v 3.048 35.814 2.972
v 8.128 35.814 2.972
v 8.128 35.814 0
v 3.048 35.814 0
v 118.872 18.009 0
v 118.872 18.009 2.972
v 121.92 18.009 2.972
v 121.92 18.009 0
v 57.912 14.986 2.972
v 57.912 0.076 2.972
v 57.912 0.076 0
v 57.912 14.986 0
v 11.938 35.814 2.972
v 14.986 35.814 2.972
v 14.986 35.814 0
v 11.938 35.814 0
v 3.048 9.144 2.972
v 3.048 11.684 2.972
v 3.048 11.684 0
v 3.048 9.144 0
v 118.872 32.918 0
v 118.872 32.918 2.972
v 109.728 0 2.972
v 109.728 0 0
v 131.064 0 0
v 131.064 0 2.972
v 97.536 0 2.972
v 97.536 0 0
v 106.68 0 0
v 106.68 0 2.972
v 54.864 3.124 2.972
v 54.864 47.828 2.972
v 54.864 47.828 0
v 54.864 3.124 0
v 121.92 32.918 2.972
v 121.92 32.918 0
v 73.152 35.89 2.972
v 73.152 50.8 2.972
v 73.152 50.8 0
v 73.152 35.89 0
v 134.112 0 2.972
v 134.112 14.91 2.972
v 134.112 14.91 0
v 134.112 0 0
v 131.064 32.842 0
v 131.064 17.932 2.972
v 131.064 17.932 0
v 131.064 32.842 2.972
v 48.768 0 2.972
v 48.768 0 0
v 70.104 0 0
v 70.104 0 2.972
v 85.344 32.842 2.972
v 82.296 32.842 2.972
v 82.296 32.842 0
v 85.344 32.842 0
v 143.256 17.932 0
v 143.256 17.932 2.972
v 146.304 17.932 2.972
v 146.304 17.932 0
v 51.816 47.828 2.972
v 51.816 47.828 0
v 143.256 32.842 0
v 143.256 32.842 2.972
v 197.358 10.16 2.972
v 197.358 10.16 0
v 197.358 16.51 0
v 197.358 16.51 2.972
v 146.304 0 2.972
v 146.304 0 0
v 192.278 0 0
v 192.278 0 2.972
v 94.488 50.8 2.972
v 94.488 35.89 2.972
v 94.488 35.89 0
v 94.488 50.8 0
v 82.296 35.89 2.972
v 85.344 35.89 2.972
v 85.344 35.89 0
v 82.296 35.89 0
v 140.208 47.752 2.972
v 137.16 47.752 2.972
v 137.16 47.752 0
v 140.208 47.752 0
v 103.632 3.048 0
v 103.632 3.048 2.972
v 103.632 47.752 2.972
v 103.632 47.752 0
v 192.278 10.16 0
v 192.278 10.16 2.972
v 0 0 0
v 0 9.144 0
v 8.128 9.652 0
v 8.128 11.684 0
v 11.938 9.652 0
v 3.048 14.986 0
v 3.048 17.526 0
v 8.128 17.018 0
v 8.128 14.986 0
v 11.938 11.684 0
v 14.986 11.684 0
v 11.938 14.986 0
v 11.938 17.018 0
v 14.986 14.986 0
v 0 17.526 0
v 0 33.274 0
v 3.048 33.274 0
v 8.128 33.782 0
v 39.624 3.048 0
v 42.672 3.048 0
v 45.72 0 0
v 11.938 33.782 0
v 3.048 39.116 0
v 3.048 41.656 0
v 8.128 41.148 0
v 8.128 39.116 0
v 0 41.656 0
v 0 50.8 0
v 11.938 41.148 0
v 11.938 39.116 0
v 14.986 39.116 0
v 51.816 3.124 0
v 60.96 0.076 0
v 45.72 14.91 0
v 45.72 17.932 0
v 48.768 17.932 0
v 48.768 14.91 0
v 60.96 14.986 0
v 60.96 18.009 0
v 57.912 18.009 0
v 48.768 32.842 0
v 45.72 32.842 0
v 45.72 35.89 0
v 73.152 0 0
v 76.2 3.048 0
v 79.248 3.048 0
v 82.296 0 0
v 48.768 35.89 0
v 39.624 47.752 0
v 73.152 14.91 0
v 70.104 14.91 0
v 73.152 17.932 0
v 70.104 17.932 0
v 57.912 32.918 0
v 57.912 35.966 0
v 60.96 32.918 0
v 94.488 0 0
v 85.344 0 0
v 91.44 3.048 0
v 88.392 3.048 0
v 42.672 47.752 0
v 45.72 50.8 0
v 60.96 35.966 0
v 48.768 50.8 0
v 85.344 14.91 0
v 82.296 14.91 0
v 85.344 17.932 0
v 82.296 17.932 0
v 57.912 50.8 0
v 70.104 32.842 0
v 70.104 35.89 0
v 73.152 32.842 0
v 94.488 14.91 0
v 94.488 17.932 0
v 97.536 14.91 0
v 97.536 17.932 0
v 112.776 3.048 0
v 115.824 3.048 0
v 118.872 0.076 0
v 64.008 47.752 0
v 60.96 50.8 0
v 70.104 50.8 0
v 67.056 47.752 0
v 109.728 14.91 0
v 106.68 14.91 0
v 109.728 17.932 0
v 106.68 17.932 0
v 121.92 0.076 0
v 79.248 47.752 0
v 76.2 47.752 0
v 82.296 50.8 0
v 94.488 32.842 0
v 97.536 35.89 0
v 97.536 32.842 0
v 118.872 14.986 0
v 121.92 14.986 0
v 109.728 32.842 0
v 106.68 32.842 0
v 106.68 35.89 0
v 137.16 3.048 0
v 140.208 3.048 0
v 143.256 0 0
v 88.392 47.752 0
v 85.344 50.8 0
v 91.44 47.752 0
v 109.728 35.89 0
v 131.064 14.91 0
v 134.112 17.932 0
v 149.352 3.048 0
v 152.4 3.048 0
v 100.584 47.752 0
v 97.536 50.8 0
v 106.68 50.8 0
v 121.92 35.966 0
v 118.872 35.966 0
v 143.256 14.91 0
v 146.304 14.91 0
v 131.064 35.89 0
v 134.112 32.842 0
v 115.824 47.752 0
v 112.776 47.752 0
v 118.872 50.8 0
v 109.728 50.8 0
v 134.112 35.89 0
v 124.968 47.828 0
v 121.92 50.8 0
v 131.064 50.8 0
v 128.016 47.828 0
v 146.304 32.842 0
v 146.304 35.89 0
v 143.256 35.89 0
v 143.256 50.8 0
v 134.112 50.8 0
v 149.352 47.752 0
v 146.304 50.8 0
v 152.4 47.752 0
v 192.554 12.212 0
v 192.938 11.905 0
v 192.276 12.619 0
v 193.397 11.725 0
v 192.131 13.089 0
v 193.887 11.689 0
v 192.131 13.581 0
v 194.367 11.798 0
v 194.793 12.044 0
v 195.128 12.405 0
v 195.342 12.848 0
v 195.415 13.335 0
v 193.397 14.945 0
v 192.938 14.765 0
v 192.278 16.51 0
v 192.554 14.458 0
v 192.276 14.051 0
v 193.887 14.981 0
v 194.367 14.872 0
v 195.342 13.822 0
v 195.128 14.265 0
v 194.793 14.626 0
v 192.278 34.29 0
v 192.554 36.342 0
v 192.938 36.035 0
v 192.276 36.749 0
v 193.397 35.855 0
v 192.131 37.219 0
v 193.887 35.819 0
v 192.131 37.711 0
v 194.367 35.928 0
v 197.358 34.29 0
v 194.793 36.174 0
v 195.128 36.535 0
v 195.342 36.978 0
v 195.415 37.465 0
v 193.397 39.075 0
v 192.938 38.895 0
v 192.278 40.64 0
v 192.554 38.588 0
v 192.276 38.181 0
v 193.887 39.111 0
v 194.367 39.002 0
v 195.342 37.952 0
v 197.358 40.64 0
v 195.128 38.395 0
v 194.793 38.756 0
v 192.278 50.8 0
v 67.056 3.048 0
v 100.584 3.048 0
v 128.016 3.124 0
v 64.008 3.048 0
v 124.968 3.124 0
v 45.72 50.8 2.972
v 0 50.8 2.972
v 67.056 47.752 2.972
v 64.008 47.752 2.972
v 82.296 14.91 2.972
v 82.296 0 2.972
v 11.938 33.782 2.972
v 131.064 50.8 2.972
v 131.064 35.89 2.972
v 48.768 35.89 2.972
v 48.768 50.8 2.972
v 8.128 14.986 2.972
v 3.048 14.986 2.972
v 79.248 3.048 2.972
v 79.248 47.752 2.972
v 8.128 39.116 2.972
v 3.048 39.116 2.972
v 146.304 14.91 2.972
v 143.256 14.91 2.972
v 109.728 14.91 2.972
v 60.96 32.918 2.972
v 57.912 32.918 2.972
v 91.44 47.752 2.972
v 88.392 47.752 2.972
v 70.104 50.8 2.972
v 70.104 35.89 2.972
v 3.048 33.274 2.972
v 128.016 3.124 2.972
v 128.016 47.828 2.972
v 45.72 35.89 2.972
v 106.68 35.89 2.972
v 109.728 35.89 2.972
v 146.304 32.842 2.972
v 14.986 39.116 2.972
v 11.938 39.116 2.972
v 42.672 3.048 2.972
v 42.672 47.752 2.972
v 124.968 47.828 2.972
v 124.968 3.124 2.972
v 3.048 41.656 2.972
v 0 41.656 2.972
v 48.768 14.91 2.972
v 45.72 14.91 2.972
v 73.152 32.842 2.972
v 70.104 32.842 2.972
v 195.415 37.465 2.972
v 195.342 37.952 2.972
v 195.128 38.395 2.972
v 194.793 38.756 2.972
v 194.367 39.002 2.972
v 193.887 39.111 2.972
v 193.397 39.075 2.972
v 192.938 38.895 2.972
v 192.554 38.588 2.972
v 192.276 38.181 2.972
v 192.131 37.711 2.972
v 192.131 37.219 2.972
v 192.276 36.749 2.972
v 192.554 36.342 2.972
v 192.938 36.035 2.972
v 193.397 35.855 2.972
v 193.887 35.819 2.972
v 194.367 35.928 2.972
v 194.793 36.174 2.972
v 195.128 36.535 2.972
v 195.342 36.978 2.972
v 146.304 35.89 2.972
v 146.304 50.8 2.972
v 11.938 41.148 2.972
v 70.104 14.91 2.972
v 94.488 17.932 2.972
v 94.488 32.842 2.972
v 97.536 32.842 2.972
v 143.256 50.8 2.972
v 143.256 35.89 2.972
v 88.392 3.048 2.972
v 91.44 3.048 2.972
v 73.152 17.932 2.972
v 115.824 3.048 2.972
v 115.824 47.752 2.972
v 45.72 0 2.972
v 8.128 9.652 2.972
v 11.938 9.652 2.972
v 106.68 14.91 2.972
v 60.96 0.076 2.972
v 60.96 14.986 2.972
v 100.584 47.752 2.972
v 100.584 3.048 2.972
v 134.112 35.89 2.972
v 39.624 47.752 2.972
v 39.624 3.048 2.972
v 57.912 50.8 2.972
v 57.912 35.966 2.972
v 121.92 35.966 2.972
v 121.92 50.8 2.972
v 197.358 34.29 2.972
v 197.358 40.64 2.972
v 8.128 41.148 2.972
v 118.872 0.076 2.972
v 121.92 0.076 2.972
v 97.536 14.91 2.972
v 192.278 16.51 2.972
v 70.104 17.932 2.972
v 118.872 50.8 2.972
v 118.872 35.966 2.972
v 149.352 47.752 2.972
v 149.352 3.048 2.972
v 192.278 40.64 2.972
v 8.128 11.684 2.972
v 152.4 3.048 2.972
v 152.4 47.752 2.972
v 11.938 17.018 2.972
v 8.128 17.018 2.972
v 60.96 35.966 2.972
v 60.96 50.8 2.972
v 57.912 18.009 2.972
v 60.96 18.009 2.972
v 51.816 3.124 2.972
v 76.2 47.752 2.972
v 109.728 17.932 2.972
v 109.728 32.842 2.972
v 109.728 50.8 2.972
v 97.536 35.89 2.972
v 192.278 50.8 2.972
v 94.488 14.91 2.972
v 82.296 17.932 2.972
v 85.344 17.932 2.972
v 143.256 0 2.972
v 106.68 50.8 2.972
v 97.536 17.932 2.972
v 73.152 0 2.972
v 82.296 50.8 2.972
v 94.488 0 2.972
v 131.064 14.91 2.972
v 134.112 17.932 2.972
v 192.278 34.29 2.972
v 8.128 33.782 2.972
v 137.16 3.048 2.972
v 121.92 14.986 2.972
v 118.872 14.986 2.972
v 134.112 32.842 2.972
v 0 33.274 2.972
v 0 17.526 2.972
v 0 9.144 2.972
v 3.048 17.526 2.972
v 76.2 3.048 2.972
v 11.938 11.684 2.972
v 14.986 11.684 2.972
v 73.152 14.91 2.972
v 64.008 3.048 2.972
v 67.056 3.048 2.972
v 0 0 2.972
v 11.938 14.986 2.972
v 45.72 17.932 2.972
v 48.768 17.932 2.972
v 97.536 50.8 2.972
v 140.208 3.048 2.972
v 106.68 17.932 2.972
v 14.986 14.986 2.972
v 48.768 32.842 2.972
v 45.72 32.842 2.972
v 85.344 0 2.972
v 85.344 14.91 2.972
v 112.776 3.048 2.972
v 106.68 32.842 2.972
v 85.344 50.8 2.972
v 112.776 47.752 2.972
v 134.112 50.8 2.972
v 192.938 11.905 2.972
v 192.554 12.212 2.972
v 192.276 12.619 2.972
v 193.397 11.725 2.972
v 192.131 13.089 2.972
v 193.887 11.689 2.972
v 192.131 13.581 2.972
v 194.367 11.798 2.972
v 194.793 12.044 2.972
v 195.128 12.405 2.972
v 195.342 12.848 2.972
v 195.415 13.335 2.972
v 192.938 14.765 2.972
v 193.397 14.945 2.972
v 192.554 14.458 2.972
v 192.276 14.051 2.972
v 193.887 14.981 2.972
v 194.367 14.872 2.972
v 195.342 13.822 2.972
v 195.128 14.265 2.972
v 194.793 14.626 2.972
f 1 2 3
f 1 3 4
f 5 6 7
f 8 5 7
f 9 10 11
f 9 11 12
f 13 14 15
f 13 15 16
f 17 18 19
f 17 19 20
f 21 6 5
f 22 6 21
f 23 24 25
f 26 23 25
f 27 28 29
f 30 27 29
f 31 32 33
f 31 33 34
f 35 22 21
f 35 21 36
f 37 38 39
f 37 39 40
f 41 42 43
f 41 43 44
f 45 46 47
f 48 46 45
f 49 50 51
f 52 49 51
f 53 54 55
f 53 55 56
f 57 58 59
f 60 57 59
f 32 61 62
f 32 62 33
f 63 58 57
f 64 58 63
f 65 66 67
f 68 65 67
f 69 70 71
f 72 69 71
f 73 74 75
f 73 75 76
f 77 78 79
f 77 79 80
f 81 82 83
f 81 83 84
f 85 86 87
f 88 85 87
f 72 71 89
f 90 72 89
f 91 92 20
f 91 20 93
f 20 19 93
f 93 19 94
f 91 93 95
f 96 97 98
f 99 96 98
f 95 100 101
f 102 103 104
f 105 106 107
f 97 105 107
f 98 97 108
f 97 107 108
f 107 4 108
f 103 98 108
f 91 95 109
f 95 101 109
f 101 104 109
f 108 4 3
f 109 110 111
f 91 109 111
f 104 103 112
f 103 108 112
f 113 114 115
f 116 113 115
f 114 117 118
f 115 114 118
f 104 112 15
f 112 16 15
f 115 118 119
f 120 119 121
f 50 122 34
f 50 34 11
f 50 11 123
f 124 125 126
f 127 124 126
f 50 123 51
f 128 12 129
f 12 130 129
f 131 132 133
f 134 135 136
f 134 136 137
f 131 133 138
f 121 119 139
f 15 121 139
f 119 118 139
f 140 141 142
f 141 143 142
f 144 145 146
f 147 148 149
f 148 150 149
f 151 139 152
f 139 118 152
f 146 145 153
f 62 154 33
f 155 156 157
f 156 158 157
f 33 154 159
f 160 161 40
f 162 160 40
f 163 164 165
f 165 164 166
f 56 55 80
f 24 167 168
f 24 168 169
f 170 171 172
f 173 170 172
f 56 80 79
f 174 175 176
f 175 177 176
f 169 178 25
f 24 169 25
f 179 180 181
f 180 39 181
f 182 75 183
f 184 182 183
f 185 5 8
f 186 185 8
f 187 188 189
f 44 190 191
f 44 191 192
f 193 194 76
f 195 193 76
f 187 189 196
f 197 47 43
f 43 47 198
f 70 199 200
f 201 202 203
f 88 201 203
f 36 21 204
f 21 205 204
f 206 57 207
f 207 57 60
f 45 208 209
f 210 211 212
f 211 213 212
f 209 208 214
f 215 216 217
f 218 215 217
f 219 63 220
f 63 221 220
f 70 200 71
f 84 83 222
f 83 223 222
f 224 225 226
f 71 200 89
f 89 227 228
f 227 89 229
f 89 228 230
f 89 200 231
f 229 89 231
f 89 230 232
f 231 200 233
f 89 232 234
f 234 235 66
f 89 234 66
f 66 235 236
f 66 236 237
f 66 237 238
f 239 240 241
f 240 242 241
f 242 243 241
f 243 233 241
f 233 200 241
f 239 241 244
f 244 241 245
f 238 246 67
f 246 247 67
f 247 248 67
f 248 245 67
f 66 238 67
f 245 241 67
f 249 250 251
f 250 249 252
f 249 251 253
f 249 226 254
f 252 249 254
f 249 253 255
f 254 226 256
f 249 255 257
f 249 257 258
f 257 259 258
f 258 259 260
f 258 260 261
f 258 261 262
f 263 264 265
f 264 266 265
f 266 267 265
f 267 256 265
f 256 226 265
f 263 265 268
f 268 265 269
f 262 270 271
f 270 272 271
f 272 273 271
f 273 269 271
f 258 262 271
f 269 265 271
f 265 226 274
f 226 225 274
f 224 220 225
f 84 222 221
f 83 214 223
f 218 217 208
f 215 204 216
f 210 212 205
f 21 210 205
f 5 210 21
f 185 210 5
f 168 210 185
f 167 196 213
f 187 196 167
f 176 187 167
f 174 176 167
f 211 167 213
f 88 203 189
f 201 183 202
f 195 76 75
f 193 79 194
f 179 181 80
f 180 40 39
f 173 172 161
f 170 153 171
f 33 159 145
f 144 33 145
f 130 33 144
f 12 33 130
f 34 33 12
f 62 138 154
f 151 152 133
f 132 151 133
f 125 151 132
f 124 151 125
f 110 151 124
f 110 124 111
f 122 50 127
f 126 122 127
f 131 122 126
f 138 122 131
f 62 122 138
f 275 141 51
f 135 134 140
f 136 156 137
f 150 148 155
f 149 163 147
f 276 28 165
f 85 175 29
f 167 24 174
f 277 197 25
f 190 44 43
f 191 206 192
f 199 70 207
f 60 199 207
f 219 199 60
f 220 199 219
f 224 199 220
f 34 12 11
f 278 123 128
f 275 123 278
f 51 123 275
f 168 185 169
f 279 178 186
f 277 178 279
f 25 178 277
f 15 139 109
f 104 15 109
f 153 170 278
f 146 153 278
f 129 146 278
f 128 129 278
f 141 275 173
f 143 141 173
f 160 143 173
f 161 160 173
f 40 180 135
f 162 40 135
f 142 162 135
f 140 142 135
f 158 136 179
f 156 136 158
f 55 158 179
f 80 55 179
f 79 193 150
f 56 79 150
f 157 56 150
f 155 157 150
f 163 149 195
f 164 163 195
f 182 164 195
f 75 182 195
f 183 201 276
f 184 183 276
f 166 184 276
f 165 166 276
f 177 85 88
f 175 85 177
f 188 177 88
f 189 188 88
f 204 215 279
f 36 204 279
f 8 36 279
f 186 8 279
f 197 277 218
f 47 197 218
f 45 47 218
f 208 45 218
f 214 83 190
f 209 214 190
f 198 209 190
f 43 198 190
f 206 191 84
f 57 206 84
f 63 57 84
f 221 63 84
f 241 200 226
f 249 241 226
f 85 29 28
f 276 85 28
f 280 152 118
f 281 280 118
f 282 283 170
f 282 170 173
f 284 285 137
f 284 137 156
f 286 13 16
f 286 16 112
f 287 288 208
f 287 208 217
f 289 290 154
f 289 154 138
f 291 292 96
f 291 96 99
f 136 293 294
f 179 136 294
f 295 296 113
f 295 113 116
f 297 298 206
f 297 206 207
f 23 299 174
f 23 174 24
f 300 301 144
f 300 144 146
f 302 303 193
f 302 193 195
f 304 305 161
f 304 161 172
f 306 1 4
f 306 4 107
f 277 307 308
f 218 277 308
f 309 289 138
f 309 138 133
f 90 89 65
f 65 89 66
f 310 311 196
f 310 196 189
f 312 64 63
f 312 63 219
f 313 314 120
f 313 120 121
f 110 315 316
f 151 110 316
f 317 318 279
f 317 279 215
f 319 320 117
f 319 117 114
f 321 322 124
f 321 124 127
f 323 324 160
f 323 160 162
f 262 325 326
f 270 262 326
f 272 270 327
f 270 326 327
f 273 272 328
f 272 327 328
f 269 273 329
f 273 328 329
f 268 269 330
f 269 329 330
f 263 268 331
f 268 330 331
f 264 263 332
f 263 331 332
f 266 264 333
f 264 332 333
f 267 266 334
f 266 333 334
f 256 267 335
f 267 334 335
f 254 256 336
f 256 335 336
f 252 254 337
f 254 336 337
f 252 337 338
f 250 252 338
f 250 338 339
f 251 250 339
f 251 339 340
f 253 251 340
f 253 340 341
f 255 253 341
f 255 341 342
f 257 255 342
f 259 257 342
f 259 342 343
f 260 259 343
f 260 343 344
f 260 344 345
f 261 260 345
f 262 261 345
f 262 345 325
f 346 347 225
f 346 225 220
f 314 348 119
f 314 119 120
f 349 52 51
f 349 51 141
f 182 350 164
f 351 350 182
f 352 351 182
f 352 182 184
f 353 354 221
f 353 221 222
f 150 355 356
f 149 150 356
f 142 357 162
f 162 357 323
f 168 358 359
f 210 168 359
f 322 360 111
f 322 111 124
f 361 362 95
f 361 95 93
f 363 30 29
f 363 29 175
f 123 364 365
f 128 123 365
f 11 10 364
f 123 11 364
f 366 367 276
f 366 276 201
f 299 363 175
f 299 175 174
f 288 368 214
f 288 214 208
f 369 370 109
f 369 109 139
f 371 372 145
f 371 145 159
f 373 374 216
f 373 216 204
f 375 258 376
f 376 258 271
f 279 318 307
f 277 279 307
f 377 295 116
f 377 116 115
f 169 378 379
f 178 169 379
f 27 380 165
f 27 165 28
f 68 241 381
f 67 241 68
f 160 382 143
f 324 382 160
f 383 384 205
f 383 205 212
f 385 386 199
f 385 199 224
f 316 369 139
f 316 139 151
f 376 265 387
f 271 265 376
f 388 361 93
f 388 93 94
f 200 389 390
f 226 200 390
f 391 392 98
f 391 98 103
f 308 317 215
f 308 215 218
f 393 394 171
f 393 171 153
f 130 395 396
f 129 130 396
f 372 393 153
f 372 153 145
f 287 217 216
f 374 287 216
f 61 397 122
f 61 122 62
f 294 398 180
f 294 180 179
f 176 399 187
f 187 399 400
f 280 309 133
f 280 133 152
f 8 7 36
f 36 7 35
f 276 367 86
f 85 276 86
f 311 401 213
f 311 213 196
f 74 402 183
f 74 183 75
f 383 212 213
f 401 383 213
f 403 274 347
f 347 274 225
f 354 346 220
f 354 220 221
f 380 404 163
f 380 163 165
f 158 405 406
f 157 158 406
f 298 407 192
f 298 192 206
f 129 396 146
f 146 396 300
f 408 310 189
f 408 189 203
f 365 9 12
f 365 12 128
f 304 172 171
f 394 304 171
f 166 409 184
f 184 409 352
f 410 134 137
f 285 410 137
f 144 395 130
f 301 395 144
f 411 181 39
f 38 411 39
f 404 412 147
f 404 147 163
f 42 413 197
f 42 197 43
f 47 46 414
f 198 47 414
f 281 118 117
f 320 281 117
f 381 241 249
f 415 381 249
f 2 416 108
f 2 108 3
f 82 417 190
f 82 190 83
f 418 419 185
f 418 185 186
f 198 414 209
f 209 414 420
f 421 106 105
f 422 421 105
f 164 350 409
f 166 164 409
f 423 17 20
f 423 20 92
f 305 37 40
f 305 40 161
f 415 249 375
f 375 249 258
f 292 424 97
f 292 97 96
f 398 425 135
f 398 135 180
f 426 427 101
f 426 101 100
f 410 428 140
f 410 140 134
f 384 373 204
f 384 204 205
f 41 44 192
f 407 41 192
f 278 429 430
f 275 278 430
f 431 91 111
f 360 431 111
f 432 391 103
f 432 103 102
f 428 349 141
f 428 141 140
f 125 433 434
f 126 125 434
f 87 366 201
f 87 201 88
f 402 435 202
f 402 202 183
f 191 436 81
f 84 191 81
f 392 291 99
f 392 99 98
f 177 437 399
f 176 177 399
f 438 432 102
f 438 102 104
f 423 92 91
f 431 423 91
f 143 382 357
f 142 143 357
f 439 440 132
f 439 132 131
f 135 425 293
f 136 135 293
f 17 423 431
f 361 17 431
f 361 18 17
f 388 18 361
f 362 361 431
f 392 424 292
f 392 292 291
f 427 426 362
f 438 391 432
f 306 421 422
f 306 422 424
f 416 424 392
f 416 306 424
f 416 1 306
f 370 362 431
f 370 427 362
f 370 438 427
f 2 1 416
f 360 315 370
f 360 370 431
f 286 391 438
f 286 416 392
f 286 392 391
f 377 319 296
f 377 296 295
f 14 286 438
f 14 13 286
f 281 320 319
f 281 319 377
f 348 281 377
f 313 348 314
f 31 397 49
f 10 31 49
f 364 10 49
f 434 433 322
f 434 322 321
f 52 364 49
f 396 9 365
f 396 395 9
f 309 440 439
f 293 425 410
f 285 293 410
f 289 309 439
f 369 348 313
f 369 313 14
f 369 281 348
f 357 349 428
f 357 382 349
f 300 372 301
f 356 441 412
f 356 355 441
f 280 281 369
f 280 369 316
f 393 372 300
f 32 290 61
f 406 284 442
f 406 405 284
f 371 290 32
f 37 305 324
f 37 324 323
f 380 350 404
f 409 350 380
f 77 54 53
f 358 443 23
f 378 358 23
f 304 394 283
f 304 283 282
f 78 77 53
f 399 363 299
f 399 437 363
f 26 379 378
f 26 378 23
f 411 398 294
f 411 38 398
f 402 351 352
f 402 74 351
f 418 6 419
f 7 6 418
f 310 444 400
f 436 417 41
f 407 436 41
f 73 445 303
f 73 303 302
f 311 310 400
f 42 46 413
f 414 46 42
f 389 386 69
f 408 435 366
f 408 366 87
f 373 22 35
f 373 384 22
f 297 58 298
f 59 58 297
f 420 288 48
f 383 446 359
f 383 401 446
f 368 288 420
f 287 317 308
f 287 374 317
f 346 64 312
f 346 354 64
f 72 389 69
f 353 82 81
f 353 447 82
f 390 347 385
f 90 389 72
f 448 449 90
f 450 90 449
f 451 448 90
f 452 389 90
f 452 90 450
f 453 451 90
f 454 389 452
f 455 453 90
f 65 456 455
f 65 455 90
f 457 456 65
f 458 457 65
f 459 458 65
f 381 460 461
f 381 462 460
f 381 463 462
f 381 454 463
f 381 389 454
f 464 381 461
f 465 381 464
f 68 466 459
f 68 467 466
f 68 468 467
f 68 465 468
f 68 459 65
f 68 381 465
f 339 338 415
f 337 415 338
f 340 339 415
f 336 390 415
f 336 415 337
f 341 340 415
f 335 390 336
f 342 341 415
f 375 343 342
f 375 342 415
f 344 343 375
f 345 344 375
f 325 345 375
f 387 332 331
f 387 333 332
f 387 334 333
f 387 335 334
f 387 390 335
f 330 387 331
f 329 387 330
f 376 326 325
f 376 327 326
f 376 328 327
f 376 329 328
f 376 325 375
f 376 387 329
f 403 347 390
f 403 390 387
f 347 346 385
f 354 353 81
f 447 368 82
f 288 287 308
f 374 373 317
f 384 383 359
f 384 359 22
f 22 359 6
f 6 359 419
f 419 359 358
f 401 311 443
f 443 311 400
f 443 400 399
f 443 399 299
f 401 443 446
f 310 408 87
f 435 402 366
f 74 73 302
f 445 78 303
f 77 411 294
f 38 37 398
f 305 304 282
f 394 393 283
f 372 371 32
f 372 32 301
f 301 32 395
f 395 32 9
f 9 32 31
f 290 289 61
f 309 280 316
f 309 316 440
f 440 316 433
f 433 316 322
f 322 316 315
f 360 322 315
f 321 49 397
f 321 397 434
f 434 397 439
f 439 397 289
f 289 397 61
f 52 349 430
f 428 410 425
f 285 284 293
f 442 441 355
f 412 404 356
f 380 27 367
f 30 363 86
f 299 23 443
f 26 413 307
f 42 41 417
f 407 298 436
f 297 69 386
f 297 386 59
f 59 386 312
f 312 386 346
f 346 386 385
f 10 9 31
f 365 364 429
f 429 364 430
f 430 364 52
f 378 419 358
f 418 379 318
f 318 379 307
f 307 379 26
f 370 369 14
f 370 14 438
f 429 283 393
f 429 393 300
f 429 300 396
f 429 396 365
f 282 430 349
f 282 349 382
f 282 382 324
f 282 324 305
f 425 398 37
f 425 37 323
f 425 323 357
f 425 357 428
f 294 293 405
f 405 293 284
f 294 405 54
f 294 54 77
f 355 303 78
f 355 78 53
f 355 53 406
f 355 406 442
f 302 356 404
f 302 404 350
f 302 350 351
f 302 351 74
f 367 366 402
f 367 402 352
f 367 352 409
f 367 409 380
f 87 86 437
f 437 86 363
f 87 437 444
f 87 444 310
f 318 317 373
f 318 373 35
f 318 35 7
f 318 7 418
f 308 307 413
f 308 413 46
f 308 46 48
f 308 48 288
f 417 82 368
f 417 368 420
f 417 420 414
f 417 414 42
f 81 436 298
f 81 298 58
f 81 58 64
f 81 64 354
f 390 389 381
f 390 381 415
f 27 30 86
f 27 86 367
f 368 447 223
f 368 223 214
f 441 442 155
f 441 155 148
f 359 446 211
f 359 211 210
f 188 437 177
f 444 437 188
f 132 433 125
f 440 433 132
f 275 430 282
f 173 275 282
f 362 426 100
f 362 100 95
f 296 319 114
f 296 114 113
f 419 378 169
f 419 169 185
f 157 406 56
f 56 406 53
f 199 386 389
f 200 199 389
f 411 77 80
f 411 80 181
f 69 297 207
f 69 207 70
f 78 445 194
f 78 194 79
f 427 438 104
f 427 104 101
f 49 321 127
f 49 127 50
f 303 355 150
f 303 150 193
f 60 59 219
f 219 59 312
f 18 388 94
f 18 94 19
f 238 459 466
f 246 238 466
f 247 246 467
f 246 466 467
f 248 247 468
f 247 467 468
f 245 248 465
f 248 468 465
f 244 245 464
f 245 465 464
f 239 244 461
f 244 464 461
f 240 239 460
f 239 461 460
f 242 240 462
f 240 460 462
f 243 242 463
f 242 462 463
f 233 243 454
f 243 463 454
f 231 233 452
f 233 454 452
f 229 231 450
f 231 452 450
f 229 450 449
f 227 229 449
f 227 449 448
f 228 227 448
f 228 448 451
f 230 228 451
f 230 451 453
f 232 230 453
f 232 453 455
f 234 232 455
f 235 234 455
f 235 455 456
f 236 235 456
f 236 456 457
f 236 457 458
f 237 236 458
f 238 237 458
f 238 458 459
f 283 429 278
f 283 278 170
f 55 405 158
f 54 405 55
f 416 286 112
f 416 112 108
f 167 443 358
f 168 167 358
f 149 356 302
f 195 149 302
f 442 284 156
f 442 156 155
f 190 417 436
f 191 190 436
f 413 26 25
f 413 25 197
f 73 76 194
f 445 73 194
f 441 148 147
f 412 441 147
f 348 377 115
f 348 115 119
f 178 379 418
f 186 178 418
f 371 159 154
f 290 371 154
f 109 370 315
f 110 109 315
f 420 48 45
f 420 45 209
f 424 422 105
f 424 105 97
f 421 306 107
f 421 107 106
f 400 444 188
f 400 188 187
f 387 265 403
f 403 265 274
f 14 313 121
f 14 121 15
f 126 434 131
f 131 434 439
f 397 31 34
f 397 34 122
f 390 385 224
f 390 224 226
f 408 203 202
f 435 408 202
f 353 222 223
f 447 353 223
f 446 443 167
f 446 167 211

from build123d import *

# Parameters (mm, degrees)
F0_W     = 5.08
F0_H     = 6.35
F1_DEPTH = 2.9718
F2_W     = 3.048
F2_H     = 14.9098
F2_H_2   = 44.704
F2_R     = 1.651
F3_DEPTH = 25.4


with BuildPart() as f1:
    # F0 (on Top) → F1 (new body)
    with BuildSketch(Plane.XY):
        with Locations((194.818, 37.465)):
            Rectangle(F0_W, F0_H)
        with Locations((194.818, 13.335)):
            Rectangle(F0_W, F0_H)
        Polygon((0, 50.8), (0, 0), (192.278, 0), (192.278, 10.16), (192.278, 16.51), (192.278, 34.29), (192.278, 40.64), (192.278, 50.8), align=None)
    extrude(amount=F1_DEPTH)

    # F2 (on face) → F3 (intersect)
    with BuildSketch(Plane.XY.offset(2.9718)):
        Polygon((0, 50.8), (0, 41.656), (3.048, 41.656), (3.048, 39.116), (8.128, 39.116), (8.128, 41.148), (11.938, 41.148), (11.938, 39.116), (14.986, 39.116), (14.986, 35.814), (11.938, 35.814), (11.938, 33.782), (8.128, 33.782), (8.128, 35.814), (3.048, 35.814), (3.048, 33.274), (0, 33.274), (0, 17.526), (3.048, 17.526), (3.048, 14.986), (8.128, 14.986), (8.128, 17.018), (11.938, 17.018), (11.938, 14.986), (14.986, 14.986), (14.986, 11.684), (11.938, 11.684), (11.938, 9.652), (8.128, 9.652), (8.128, 11.684), (3.048, 11.684), (3.048, 9.144), (0, 9.144), (0, 0), (45.72, 0), (45.72, 14.9098), (48.768, 14.9098), (48.768, 0), (70.104, 0), (70.104, 14.9098), (73.152, 14.9098), (73.152, 0), (82.296, 0), (82.296, 14.9098), (85.344, 14.9098), (85.344, 0), (94.488, 0), (94.488, 14.9098), (97.536, 14.9098), (97.536, 0), (106.68, 0), (106.68, 14.9098), (109.728, 14.9098), (109.728, 0), (131.064, 0), (131.064, 14.9098), (134.112, 14.9098), (134.112, 0), (143.256, 0), (143.256, 14.9098), (146.304, 14.9098), (146.304, 0), (192.278, 0), (192.278, 10.16), (197.358, 10.16), (197.358, 16.51), (192.278, 16.51), (192.278, 34.29), (197.358, 34.29), (197.358, 40.64), (192.278, 40.64), (192.278, 50.8), (146.304, 50.8), (146.304, 35.8902), (143.256, 35.8902), (143.256, 50.8), (134.112, 50.8), (134.112, 35.8902), (131.064, 35.8902), (131.064, 50.8), (121.92, 50.8), (121.92, 35.9664), (118.872, 35.9664), (118.872, 50.8), (109.728, 50.8), (109.728, 35.8902), (106.68, 35.8902), (106.68, 50.8), (97.536, 50.8), (97.536, 35.8902), (94.488, 35.8902), (94.488, 50.8), (85.344, 50.8), (85.344, 35.8902), (82.296, 35.8902), (82.296, 50.8), (73.152, 50.8), (73.152, 35.8902), (70.104, 35.8902), (70.104, 50.8), (60.96, 50.8), (60.96, 35.9664), (57.912, 35.9664), (57.912, 50.8), (48.768, 50.8), (48.768, 35.8902), (45.72, 35.8902), (45.72, 50.8), align=None)
        with Locations((59.436, 7.5311)):
            Rectangle(F2_W, F2_H, mode=Mode.SUBTRACT)
        with Locations((41.148, 25.4)):
            Rectangle(F2_W, F2_H_2, mode=Mode.SUBTRACT)
        with Locations((47.244, 25.3873)):
            Rectangle(F2_W, F2_H, mode=Mode.SUBTRACT)
        with Locations((65.532, 25.4)):
            Rectangle(F2_W, F2_H_2, mode=Mode.SUBTRACT)
        with Locations((71.628, 25.3873)):
            Rectangle(F2_W, F2_H, mode=Mode.SUBTRACT)
        with Locations((77.724, 25.4)):
            Rectangle(F2_W, F2_H_2, mode=Mode.SUBTRACT)
        with Locations((83.82, 25.3873)):
            Rectangle(F2_W, F2_H, mode=Mode.SUBTRACT)
        with Locations((89.916, 25.4)):
            Rectangle(F2_W, F2_H_2, mode=Mode.SUBTRACT)
        with Locations((96.012, 25.3873)):
            Rectangle(F2_W, F2_H, mode=Mode.SUBTRACT)
        with Locations((120.396, 7.5311)):
            Rectangle(F2_W, F2_H, mode=Mode.SUBTRACT)
        with Locations((102.108, 25.4)):
            Rectangle(F2_W, F2_H_2, mode=Mode.SUBTRACT)
        with Locations((108.204, 25.3873)):
            Rectangle(F2_W, F2_H, mode=Mode.SUBTRACT)
        with Locations((114.3, 25.4)):
            Rectangle(F2_W, F2_H_2, mode=Mode.SUBTRACT)
        with Locations((132.588, 25.3873)):
            Rectangle(F2_W, F2_H, mode=Mode.SUBTRACT)
        with Locations((138.684, 25.4)):
            Rectangle(F2_W, F2_H_2, mode=Mode.SUBTRACT)
        with Locations((144.78, 25.3873)):
            Rectangle(F2_W, F2_H, mode=Mode.SUBTRACT)
        with Locations((193.7639, 13.335)):
            Circle(F2_R, mode=Mode.SUBTRACT)
        with Locations((150.876, 25.4)):
            Rectangle(F2_W, F2_H_2, mode=Mode.SUBTRACT)
        Polygon((54.864, 3.1242), (51.816, 3.1242), (51.816, 17.9324), (51.816, 32.8422), (51.816, 47.8282), (54.864, 47.8282), align=None, mode=Mode.SUBTRACT)
        with Locations((59.436, 25.4635)):
            Rectangle(F2_W, F2_H, mode=Mode.SUBTRACT)
        with Locations((120.396, 25.4635)):
            Rectangle(F2_W, F2_H, mode=Mode.SUBTRACT)
        with Locations((126.492, 25.4762)):
            Rectangle(F2_W, F2_H_2, mode=Mode.SUBTRACT)
        with Locations((193.7639, 37.465)):
            Circle(F2_R, mode=Mode.SUBTRACT)
    extrude(amount=-F3_DEPTH, mode=Mode.INTERSECT)


solid = f1.part
